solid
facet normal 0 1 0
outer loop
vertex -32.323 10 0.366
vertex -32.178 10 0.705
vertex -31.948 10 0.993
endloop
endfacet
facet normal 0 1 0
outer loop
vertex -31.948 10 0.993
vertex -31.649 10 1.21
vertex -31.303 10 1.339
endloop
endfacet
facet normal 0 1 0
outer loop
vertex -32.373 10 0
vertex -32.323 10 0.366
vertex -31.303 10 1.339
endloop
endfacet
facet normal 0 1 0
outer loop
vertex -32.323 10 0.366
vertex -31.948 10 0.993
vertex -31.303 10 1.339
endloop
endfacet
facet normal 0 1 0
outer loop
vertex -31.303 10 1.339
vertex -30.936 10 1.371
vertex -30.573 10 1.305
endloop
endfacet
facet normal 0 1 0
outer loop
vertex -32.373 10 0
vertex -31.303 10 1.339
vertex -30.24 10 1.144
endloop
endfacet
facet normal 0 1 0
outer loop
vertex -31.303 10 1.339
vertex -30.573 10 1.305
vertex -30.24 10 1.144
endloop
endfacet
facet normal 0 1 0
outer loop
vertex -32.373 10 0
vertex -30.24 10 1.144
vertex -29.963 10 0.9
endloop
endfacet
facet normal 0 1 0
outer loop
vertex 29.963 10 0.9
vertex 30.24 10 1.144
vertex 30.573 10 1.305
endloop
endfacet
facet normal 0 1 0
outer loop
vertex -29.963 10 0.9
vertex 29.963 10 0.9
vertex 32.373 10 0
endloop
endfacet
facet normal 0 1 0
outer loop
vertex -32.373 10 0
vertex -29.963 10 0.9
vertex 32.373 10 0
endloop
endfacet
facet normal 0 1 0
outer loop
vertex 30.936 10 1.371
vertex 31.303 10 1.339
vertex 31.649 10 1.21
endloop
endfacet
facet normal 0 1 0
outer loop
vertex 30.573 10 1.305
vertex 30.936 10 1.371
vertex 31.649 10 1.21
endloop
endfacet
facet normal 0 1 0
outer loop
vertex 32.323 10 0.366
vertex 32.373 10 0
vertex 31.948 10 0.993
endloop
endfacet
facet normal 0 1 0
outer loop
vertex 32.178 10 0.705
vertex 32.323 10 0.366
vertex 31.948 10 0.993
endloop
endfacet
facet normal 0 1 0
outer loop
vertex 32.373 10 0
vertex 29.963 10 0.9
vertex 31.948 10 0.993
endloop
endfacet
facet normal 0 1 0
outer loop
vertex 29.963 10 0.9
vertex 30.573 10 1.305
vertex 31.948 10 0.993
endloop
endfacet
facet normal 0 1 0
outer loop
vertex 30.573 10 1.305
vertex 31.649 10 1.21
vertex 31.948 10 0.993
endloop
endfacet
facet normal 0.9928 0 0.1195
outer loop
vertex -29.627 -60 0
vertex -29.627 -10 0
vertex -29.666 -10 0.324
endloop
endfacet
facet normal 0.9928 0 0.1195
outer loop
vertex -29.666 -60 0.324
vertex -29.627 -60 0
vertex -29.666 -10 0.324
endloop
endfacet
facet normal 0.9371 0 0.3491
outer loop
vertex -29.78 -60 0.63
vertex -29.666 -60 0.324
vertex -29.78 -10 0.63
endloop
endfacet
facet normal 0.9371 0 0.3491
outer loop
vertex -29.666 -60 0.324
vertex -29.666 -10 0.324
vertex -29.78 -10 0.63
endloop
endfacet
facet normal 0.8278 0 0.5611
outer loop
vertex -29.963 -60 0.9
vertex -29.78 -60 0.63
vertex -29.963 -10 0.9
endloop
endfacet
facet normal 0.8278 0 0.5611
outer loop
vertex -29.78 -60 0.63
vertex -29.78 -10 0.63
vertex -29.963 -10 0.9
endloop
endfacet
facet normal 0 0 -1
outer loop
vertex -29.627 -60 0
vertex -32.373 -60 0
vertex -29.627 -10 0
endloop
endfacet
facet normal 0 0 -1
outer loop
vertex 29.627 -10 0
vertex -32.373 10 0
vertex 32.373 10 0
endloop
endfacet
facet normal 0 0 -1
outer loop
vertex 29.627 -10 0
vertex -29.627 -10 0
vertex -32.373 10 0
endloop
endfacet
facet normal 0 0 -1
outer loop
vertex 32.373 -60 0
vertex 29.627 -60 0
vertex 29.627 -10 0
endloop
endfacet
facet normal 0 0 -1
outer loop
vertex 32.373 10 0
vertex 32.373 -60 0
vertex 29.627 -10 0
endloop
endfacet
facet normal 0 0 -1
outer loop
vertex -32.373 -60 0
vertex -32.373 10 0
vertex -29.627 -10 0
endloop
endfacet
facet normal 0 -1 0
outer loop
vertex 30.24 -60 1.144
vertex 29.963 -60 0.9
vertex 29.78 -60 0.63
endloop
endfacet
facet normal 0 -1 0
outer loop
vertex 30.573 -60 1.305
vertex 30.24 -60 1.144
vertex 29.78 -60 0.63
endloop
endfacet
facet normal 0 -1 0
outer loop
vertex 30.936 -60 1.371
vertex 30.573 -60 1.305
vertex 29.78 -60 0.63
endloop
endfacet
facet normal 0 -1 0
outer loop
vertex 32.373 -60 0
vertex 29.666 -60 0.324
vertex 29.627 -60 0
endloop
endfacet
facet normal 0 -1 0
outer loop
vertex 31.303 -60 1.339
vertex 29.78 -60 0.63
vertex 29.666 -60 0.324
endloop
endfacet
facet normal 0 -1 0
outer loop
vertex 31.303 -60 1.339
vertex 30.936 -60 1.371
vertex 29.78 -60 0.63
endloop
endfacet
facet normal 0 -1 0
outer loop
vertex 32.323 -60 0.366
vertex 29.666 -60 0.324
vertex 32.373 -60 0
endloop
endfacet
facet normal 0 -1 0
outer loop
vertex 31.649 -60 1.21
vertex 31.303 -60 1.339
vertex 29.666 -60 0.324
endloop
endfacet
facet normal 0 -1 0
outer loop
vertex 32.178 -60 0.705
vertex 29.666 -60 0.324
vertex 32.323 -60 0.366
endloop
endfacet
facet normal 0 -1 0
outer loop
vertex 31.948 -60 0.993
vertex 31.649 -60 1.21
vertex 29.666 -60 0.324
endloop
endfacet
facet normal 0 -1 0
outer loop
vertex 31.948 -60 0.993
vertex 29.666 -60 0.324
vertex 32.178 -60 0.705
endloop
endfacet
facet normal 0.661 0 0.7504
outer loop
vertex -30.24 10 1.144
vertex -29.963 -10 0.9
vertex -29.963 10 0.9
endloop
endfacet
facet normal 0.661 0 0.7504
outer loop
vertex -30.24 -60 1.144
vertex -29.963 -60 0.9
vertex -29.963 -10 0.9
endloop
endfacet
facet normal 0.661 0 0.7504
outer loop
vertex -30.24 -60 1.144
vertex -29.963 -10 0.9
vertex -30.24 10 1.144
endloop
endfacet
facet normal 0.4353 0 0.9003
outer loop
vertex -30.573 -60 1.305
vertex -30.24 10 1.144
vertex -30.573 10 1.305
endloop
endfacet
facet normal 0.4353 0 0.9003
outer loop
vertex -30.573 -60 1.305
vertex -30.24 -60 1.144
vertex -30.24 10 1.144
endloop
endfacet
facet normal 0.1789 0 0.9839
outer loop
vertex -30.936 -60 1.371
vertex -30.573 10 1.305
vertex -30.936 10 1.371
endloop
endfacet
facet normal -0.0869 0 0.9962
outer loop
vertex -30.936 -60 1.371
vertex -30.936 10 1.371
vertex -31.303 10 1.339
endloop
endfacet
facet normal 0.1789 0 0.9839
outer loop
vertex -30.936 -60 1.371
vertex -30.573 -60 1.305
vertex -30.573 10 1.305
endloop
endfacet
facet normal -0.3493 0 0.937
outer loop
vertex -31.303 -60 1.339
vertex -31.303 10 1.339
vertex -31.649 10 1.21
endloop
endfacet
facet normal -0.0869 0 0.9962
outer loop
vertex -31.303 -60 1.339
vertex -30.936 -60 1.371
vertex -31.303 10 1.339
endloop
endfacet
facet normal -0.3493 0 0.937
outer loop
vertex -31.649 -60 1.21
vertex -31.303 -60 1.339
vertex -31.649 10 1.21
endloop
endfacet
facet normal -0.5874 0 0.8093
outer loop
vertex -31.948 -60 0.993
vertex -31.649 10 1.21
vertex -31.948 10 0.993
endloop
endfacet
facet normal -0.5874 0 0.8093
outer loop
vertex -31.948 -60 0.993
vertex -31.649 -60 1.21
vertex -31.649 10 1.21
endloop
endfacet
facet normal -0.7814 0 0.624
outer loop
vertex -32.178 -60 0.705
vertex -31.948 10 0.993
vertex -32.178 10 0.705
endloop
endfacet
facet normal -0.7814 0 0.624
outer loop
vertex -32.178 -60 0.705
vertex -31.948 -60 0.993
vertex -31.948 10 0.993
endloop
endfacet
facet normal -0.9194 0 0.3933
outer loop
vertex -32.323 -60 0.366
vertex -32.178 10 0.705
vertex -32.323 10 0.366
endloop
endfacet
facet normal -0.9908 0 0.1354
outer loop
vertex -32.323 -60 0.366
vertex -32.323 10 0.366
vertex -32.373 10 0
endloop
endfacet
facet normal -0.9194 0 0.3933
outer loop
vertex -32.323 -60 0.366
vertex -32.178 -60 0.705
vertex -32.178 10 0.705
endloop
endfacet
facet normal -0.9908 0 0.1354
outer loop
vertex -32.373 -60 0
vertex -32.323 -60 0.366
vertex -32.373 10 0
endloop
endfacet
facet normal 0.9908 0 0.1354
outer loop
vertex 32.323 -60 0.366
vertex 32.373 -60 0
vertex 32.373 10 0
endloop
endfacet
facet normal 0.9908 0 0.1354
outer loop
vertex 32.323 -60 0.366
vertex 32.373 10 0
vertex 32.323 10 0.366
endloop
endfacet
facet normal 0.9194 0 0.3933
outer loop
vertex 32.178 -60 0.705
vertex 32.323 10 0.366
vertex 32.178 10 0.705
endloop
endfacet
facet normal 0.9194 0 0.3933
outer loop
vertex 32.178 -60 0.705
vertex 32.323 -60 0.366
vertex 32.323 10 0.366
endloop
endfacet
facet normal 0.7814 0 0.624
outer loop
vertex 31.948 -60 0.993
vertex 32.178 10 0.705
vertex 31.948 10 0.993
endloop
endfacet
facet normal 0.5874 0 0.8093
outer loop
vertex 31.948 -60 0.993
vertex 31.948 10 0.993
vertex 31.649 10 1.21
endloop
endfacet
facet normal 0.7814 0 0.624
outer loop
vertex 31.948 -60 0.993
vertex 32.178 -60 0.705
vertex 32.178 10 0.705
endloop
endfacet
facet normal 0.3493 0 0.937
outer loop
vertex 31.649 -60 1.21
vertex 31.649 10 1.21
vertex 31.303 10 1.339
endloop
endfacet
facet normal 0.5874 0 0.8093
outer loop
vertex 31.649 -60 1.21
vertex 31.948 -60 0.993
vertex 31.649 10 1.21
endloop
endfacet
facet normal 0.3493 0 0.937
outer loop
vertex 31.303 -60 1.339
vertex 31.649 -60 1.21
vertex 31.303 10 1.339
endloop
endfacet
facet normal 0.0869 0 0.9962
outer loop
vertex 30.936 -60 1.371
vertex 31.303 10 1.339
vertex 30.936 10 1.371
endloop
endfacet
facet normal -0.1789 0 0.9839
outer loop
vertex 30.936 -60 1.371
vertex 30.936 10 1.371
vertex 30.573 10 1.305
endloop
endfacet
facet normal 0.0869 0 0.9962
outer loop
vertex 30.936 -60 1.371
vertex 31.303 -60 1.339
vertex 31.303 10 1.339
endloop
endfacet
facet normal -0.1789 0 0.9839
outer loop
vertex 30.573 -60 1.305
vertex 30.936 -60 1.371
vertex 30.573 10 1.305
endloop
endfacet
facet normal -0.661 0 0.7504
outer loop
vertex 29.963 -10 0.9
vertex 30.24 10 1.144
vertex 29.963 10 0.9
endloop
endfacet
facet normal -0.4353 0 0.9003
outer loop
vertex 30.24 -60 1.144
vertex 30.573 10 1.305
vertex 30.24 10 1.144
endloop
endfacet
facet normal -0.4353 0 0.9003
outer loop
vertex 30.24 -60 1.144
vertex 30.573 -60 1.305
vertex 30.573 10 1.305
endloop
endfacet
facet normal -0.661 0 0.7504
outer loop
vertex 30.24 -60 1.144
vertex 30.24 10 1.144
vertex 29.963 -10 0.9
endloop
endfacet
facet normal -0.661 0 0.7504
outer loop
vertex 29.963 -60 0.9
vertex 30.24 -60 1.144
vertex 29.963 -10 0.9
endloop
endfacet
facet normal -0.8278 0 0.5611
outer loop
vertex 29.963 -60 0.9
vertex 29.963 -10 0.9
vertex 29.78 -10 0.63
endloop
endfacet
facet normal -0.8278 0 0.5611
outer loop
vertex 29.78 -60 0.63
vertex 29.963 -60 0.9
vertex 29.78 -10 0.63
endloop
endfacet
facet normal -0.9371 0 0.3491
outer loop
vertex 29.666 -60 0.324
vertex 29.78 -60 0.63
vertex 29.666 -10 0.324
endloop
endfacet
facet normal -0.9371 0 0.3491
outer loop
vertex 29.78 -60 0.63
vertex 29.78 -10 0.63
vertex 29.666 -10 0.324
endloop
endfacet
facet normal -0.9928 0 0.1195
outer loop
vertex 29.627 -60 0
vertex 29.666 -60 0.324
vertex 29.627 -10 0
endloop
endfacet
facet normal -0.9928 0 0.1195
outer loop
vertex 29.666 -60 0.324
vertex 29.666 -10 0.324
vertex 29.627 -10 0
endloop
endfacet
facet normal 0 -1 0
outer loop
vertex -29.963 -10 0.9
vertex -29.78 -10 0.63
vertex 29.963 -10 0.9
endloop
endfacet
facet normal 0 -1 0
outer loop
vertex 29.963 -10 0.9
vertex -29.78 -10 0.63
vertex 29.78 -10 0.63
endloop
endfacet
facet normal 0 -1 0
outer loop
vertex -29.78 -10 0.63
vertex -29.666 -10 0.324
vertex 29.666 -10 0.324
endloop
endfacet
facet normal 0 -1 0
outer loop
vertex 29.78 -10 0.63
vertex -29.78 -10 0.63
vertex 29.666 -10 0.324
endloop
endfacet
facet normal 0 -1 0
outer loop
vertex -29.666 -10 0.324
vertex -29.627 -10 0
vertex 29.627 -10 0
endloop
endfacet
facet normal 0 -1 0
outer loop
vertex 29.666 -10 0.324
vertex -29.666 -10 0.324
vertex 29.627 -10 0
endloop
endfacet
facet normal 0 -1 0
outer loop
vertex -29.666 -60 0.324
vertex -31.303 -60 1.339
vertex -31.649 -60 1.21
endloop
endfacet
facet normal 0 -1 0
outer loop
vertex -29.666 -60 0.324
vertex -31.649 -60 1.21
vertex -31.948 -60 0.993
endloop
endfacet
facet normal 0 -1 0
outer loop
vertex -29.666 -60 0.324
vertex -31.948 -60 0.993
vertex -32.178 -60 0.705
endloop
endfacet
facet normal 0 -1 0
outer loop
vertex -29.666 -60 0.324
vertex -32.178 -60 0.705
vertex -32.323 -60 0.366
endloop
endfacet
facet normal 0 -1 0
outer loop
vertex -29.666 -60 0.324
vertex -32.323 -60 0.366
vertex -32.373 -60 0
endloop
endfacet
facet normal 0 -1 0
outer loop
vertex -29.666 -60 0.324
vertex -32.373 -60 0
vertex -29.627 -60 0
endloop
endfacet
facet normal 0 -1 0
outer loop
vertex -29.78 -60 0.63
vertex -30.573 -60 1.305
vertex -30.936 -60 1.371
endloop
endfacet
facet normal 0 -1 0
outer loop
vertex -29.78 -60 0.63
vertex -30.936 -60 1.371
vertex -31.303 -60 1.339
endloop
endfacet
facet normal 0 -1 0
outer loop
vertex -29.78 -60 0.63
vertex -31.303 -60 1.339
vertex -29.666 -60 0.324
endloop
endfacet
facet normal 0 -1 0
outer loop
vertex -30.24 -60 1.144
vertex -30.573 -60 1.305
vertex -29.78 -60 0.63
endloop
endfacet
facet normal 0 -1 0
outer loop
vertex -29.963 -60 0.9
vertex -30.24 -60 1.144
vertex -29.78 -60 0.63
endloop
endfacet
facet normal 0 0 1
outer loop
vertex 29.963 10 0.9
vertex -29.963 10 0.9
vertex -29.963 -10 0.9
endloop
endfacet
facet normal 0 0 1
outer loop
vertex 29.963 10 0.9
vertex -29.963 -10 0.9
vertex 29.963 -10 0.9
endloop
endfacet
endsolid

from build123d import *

# Parameters (mm, degrees)
F0_W          = 62
F0_H          = 20
F1_DEPTH      = 0.9
F3_DEPTH      = 50
F3_DEPTH_BACK = 20


with BuildPart() as f1:
    # F0 (on Top) → F1 (new body)
    with BuildSketch(Plane.XY):
        Rectangle(F0_W, F0_H)
    extrude(amount=F1_DEPTH)

    # F2 (on face) → F3 (join, two sides)
    with BuildSketch(Plane.XZ.offset(10)) as f3_sk:
        with BuildLine():
            ThreePointArc((-29.963264, 0.9), (-31.480364, 1.286107), (-32.372888, 0))
            Line((-32.372888, 0), (-31, 0))
            Line((-31, 0), (-31, 0.9))
            Line((-31, 0.9), (-29.963264, 0.9))
        make_face()
        with BuildLine():
            ThreePointArc((-29.627112, 0), (-29.713893, 0.480364), (-29.963264, 0.9))
            Line((-29.963264, 0.9), (-31, 0.9))
            Line((-31, 0.9), (-31, 0))
            Line((-31, 0), (-29.627112, 0))
        make_face()
        with BuildLine():
            ThreePointArc((32.372888, 0), (31.480364, 1.286107), (29.963264, 0.9))
            Line((29.963264, 0.9), (31, 0.9))
            Line((31, 0.9), (31, 0))
            Line((31, 0), (32.372888, 0))
        make_face()
        with BuildLine():
            Line((31, 0.9), (29.963264, 0.9))
            ThreePointArc((29.963264, 0.9), (29.713893, 0.480364), (29.627112, 0))
            Line((29.627112, 0), (31, 0))
            Line((31, 0), (31, 0.9))
        make_face()
    extrude(amount=F3_DEPTH)
    extrude(f3_sk.sketch, amount=-F3_DEPTH_BACK)


solid = f1.part
